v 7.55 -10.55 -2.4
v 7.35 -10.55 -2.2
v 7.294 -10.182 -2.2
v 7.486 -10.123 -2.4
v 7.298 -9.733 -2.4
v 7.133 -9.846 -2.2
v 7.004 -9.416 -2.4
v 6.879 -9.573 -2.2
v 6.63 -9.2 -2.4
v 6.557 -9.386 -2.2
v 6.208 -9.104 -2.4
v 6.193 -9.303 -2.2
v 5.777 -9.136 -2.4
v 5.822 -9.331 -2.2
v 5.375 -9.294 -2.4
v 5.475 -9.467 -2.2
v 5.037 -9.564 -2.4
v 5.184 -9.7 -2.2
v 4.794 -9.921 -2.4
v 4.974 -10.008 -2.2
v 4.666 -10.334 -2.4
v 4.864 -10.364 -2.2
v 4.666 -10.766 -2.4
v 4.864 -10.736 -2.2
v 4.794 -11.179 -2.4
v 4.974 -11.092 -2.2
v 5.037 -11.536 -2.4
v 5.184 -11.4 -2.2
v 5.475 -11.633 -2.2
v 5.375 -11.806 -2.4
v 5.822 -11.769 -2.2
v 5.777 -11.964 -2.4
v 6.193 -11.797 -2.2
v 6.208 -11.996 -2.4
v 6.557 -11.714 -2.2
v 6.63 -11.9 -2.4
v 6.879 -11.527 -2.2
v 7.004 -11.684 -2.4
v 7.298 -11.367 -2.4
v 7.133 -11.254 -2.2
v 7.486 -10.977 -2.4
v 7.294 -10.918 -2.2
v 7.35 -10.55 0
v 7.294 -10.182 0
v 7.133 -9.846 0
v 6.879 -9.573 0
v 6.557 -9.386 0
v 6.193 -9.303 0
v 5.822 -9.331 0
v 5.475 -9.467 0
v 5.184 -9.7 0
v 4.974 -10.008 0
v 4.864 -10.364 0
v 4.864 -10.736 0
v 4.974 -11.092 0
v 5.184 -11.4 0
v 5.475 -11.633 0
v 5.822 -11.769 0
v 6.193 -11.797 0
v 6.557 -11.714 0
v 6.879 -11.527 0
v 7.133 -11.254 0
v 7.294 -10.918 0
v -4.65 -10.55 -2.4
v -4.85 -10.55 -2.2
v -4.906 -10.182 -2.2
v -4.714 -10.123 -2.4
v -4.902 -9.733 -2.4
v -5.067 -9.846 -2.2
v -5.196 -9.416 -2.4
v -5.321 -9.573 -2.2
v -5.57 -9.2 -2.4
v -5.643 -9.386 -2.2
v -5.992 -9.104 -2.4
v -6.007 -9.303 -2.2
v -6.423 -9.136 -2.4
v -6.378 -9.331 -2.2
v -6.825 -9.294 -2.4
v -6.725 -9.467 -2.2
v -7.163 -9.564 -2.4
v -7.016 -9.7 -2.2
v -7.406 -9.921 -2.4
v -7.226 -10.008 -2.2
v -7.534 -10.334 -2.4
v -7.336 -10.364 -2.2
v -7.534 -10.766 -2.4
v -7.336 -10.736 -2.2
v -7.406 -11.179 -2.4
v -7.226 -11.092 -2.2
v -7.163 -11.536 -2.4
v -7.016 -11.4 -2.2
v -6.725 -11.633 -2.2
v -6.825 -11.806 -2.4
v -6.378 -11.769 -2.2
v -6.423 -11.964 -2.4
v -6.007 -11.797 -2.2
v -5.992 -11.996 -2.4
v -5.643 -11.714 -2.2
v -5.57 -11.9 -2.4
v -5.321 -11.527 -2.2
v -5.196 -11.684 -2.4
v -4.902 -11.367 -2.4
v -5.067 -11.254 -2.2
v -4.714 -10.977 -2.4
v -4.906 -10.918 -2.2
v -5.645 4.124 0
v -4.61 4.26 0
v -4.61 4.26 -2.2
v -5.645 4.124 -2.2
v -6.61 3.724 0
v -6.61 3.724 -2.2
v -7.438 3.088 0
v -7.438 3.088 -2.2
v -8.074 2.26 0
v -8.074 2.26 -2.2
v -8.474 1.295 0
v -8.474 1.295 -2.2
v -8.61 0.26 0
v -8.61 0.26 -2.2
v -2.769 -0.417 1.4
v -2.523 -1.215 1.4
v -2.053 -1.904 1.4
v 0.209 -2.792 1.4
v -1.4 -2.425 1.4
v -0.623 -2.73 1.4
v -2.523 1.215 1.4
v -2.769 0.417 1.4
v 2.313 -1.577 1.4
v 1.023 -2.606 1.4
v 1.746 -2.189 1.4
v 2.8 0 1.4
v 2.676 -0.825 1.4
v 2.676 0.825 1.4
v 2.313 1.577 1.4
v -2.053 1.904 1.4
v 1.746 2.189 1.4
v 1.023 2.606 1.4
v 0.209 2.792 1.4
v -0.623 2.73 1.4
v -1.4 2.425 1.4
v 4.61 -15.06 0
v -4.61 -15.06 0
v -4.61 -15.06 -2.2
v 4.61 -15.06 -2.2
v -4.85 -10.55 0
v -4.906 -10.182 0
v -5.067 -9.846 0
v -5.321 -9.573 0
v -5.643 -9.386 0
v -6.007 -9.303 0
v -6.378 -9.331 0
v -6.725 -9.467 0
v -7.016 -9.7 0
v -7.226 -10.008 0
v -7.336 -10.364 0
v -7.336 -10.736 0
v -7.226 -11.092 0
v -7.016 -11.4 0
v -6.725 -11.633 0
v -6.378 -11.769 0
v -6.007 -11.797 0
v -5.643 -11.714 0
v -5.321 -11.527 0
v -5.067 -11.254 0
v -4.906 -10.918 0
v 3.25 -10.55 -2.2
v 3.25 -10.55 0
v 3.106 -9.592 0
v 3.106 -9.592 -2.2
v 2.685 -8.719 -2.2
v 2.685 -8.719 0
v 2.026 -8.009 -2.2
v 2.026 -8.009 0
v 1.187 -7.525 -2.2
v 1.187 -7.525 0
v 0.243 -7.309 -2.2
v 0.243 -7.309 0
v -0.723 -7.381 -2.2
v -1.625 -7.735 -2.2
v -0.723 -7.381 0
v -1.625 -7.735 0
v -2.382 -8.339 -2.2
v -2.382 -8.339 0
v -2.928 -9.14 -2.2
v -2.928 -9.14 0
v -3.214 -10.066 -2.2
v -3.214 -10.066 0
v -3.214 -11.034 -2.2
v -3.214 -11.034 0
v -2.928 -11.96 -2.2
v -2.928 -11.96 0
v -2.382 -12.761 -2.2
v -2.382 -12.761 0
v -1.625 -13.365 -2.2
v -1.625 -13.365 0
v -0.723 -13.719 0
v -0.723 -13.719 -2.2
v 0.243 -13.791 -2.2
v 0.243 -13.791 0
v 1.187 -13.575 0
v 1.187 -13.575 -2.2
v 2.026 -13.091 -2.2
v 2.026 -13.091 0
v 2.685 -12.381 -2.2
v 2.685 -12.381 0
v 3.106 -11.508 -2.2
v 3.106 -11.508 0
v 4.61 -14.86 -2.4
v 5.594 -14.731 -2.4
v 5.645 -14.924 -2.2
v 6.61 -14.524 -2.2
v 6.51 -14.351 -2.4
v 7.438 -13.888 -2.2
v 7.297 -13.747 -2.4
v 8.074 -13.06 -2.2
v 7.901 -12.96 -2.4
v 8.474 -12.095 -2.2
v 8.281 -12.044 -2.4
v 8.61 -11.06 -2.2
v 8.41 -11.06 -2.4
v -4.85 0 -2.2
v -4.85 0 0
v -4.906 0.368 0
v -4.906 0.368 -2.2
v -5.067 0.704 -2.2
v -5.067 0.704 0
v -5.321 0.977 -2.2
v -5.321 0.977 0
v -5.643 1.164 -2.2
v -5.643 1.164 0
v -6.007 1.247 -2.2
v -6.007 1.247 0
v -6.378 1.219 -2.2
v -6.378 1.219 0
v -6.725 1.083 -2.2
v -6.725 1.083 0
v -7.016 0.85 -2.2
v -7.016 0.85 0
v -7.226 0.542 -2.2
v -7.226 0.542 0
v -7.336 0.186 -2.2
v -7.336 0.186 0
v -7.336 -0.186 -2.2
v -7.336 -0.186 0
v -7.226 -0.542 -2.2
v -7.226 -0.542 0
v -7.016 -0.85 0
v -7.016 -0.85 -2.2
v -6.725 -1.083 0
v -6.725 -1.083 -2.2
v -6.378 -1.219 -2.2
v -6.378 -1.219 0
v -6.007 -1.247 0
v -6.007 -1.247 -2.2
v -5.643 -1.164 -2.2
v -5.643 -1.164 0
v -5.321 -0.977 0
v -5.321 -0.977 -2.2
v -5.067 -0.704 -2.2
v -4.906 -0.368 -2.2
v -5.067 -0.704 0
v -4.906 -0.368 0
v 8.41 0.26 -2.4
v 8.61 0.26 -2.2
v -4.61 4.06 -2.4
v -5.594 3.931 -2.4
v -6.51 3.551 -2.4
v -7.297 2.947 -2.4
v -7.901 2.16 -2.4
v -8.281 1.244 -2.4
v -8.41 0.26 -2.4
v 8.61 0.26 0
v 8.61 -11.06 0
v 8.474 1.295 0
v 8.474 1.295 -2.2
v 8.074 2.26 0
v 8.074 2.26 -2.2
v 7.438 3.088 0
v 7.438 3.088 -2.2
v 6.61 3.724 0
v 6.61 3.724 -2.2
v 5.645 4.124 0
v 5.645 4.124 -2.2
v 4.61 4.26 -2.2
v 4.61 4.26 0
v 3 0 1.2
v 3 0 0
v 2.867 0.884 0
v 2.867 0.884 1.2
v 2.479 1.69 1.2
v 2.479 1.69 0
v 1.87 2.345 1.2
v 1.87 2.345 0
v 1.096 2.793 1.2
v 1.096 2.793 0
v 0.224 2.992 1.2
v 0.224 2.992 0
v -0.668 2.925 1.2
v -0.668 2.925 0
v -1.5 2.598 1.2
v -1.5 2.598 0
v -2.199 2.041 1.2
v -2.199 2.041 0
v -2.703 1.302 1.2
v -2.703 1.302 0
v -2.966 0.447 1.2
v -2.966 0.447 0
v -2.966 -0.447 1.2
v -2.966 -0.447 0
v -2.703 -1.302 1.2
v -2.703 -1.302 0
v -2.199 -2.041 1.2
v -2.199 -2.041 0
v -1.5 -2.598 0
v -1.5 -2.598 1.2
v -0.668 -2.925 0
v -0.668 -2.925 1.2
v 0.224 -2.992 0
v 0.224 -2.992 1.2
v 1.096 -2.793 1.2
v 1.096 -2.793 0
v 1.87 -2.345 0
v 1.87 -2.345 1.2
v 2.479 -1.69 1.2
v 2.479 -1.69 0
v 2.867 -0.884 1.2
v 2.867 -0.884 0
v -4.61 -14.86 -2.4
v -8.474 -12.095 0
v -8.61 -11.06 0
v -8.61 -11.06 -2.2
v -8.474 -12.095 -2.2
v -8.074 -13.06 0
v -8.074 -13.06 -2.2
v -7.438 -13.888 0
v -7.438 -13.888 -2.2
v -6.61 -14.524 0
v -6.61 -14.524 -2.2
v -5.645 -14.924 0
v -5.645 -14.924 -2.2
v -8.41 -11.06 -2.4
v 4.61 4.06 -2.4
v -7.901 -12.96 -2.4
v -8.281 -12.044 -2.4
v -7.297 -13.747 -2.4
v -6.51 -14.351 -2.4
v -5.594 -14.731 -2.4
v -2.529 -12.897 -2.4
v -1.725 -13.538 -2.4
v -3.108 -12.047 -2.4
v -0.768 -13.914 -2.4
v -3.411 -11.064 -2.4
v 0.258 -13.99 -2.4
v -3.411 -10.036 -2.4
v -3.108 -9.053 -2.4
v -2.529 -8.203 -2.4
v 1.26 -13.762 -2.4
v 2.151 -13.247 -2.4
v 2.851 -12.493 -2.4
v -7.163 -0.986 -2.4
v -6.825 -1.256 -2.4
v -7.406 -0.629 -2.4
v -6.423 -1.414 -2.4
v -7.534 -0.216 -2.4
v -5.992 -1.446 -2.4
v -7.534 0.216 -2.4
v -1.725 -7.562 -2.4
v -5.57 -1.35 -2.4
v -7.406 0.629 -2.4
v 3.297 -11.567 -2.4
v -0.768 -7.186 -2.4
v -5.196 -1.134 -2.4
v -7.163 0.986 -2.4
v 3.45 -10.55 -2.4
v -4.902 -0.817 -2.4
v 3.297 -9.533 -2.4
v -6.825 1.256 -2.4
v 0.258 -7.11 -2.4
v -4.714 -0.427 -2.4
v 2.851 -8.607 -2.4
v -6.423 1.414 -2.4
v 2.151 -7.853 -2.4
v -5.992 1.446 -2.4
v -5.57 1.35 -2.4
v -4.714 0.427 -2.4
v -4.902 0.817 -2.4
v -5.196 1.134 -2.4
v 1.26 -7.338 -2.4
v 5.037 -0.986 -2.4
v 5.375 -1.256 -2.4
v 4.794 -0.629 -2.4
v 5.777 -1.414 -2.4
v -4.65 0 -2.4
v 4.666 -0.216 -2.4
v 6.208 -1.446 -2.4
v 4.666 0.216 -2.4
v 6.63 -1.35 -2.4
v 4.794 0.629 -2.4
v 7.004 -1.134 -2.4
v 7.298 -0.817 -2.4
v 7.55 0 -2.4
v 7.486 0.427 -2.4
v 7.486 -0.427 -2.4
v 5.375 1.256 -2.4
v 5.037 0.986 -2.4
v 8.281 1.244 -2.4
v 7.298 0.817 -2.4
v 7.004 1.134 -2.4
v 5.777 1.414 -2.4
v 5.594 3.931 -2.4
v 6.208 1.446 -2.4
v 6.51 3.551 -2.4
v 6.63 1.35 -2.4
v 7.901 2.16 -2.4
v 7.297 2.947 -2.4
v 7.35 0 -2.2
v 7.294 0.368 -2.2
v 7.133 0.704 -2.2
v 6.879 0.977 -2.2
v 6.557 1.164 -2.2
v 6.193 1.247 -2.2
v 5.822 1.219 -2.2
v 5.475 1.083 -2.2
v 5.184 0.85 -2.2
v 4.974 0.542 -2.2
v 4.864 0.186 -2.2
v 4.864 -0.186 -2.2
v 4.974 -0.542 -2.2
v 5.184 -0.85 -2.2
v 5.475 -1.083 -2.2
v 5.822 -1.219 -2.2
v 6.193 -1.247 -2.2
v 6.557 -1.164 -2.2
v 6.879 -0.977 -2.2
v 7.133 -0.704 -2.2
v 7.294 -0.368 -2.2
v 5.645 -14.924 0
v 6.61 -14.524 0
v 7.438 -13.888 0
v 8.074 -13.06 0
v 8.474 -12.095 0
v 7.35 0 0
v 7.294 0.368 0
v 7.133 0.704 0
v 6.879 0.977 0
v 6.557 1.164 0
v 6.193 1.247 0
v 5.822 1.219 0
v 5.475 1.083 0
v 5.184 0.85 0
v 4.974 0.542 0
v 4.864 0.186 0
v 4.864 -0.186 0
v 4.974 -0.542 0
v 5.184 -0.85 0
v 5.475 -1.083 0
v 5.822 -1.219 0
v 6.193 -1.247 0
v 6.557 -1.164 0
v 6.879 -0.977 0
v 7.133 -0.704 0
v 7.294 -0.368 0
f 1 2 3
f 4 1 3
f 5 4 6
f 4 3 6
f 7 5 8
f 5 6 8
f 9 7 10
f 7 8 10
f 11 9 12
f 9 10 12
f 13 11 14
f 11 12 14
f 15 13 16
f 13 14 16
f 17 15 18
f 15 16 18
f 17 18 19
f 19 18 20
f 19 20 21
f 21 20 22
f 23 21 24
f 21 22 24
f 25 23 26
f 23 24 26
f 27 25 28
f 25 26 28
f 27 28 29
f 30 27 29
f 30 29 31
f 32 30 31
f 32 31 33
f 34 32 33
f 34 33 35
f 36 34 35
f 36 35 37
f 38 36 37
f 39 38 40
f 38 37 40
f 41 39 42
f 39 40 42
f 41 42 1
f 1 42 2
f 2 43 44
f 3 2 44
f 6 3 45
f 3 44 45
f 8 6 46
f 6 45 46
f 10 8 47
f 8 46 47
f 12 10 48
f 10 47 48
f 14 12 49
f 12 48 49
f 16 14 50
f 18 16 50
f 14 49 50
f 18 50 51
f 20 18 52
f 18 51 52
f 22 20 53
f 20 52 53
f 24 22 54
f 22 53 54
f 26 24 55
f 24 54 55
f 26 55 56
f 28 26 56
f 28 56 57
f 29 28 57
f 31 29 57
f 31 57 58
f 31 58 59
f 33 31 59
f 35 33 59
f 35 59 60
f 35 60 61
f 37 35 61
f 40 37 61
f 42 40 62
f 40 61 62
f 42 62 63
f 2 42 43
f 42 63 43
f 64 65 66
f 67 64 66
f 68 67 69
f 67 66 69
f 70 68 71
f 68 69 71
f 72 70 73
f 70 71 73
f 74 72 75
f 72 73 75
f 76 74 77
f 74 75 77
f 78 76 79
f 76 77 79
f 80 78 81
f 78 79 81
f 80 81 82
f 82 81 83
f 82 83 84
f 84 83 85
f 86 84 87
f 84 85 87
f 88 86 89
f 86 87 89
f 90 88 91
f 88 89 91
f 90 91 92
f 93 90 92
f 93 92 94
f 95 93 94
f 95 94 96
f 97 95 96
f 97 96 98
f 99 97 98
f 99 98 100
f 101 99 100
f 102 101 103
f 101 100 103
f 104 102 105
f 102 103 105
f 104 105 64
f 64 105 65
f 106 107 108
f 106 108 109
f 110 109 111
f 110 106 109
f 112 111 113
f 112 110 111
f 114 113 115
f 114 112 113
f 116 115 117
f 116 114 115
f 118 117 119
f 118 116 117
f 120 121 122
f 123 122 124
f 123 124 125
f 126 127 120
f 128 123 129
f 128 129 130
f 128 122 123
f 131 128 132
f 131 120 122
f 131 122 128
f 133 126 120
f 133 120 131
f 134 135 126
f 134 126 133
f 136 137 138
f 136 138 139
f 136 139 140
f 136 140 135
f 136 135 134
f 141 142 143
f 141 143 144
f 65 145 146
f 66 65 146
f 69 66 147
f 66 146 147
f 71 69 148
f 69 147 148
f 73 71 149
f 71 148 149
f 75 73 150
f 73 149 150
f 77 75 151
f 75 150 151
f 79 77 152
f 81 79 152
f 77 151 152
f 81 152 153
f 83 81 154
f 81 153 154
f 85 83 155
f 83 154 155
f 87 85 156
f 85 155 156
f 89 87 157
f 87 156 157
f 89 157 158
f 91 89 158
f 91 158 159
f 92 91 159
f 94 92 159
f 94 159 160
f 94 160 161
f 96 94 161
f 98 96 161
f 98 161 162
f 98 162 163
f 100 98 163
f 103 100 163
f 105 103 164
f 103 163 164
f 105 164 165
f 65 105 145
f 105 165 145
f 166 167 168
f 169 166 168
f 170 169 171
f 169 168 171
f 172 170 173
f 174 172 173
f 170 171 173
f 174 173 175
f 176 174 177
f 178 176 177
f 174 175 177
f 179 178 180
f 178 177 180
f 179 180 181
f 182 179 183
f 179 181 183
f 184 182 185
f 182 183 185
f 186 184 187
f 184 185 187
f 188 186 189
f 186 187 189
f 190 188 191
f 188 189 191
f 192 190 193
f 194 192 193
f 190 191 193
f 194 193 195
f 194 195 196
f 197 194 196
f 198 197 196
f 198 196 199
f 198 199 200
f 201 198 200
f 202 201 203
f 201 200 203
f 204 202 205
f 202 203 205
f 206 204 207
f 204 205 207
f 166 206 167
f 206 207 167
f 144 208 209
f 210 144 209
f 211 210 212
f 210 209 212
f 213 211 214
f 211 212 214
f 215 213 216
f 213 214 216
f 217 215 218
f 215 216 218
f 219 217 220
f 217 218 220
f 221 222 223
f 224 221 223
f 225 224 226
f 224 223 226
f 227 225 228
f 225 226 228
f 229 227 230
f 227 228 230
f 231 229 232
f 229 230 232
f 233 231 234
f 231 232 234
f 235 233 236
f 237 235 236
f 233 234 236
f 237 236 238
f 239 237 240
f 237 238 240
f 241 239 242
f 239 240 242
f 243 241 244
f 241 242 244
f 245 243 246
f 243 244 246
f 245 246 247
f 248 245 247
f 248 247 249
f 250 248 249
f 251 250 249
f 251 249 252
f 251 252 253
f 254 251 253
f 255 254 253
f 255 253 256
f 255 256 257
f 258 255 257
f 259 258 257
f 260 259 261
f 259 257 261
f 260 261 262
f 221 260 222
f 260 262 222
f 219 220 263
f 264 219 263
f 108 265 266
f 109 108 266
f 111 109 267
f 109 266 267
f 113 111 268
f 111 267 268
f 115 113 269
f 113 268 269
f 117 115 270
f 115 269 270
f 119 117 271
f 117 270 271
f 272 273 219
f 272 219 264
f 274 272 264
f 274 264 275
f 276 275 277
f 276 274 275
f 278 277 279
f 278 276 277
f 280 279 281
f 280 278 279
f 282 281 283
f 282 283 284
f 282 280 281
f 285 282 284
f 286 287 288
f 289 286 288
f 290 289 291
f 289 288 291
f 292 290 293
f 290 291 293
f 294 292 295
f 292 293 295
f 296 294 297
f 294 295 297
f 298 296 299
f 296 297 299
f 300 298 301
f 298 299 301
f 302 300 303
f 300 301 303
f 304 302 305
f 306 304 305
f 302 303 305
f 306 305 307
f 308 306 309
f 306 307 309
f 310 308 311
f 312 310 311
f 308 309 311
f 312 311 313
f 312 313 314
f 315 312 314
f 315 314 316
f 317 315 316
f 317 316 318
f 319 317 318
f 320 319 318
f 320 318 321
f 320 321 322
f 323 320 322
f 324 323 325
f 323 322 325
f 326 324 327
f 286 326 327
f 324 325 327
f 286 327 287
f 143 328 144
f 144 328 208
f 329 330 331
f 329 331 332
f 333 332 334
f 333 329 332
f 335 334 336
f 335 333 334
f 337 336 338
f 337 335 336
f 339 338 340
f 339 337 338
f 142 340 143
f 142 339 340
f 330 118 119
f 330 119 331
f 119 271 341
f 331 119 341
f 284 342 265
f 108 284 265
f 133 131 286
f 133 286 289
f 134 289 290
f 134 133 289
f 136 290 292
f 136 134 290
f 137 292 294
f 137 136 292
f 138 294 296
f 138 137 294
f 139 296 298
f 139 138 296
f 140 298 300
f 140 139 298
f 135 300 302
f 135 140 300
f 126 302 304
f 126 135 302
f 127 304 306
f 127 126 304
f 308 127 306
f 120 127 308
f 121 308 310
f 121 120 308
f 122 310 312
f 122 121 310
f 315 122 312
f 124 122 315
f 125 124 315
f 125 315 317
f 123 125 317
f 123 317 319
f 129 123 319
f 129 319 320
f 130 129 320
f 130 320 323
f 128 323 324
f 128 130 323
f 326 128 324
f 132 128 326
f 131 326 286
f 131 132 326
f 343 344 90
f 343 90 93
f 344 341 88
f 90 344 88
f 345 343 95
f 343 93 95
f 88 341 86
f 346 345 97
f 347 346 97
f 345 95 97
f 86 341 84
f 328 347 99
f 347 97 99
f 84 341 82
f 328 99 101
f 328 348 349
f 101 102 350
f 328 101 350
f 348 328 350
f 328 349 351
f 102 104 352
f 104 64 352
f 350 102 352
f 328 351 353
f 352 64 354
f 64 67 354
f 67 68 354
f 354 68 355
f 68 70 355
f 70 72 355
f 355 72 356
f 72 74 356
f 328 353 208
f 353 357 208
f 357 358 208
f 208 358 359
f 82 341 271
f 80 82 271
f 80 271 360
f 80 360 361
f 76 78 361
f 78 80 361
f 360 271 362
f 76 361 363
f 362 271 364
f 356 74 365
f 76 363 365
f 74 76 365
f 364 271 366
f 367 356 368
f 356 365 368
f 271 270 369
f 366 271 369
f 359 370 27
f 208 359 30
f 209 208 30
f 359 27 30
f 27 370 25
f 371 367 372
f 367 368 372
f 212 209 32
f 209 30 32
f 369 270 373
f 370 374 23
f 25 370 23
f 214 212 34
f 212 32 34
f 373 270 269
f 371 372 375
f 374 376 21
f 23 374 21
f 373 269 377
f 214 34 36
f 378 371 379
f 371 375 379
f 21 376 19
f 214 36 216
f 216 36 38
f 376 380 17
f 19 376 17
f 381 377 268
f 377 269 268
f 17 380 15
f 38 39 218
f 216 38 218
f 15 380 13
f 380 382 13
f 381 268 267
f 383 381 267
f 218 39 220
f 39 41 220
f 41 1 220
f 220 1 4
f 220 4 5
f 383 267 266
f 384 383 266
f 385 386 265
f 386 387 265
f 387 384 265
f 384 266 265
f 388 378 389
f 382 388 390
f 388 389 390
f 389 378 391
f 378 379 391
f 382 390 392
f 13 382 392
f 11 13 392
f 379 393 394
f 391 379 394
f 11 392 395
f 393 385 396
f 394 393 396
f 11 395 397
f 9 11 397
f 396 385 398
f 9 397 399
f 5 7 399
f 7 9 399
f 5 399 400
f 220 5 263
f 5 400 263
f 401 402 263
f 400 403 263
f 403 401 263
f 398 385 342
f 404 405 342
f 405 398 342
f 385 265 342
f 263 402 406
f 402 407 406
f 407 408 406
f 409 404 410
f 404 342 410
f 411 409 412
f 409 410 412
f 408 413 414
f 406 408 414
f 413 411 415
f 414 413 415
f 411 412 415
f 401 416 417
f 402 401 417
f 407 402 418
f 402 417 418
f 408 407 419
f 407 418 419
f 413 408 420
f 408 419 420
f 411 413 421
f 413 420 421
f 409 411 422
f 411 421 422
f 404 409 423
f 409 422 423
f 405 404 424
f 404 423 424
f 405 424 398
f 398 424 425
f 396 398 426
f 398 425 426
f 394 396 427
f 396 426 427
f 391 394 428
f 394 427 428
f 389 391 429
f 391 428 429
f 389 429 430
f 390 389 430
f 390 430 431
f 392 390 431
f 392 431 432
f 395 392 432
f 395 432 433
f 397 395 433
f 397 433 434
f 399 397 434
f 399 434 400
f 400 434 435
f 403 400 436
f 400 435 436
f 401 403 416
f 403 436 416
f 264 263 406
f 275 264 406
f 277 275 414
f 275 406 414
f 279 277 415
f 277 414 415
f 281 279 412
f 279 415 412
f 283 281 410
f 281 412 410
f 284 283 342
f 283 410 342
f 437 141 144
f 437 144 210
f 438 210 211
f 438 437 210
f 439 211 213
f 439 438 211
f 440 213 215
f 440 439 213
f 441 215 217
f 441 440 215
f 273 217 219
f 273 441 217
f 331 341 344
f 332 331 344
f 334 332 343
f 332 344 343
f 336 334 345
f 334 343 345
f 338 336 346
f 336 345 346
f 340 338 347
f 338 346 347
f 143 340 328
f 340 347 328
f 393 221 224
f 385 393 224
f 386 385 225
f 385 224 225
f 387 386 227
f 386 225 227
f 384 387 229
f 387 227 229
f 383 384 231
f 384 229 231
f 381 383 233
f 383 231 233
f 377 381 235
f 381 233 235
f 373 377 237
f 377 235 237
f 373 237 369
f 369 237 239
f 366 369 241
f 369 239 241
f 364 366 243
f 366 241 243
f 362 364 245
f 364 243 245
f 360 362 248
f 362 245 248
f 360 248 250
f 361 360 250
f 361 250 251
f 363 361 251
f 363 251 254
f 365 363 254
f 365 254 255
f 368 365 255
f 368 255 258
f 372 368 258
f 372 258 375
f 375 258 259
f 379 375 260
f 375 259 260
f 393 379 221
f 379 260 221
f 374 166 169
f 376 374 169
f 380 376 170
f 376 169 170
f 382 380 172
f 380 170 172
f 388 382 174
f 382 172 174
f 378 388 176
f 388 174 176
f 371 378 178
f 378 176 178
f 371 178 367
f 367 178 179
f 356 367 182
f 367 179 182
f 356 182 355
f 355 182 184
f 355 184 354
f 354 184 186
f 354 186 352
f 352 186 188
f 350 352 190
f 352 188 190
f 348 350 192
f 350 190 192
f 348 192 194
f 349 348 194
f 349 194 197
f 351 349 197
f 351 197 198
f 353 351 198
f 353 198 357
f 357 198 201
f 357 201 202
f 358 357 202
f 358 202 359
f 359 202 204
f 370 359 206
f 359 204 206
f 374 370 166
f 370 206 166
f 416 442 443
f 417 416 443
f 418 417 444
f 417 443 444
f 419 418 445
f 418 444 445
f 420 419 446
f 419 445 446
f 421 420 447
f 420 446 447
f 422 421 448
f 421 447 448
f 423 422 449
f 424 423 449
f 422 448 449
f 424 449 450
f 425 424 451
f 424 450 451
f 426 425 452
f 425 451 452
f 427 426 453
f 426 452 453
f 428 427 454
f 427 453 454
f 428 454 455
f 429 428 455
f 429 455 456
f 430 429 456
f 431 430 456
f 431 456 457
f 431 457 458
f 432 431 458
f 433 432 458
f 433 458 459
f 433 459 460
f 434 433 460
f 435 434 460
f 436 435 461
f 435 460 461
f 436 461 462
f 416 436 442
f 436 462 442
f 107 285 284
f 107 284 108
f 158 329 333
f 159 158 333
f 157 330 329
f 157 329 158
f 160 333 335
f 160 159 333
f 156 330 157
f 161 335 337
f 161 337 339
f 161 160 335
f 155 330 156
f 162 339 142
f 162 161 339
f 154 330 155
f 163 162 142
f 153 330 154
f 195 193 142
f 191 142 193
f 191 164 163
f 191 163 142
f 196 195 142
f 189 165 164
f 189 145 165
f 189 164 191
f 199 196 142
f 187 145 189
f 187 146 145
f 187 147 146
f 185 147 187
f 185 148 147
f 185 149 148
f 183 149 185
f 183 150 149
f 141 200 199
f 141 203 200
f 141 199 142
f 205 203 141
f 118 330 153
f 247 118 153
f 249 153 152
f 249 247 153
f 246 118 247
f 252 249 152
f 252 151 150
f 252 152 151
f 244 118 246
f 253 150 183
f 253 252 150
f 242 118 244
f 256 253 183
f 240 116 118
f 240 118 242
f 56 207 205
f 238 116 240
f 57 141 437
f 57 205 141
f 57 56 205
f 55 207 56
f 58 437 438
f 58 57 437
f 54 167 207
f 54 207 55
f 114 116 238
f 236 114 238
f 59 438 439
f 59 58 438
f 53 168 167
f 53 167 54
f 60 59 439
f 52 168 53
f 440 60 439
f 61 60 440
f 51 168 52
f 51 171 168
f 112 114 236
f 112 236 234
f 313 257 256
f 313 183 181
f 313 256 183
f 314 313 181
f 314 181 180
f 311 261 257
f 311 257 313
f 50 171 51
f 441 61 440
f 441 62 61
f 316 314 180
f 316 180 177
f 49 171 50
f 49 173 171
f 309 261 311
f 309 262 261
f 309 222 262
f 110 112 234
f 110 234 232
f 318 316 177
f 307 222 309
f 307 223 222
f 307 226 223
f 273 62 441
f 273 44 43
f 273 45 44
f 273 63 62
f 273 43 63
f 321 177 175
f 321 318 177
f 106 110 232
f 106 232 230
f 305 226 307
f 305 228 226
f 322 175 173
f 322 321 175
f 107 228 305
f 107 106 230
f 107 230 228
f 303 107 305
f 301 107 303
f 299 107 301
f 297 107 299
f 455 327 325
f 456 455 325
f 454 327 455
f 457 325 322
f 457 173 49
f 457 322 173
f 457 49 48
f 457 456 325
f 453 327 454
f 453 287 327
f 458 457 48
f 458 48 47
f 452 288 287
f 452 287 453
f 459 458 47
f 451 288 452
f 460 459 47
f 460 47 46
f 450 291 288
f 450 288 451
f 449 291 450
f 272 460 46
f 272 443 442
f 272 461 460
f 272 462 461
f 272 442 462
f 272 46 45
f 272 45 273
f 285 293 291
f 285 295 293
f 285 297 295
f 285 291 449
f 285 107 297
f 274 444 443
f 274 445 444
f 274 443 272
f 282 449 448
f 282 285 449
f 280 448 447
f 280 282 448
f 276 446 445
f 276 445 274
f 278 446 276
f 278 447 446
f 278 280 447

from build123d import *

# Parameters (mm, degrees)
F0_R     = 1.25
F0_R_2   = 3
F0_R_3   = 3.25
F1_DEPTH = 2.4
F2_DEPTH = 1.4
F3_SIZE  = 0.2
F4_SIZE  = 0.2


with BuildPart() as f1:
    # F0 (on Top) → F1 (new body)
    with BuildSketch(Plane.XY):
        with BuildLine():
            ThreePointArc((8.61, 0.26), (7.4384271247, 3.0884271247), (4.61, 4.26))
            Line((4.61, 4.26), (-4.61, 4.26))
            ThreePointArc((-4.61, 4.26), (-7.4384271247, 3.0884271247), (-8.61, 0.26))
            Line((-8.61, 0.26), (-8.61, -4.26))
            Line((-8.61, -4.26), (8.61, -4.26))
            Line((8.61, -4.26), (8.61, 0.26))
        make_face()
        with Locations((-6.1, 0)):
            Circle(F0_R, mode=Mode.SUBTRACT)
        Circle(F0_R_2, mode=Mode.SUBTRACT)
        with Locations((6.1, 0)):
            Circle(F0_R, mode=Mode.SUBTRACT)
        with BuildLine():
            Line((8.61, -11.06), (8.61, -4.26))
            Line((8.61, -4.26), (-8.61, -4.26))
            Line((-8.61, -4.26), (-8.61, -11.06))
            ThreePointArc((-8.61, -11.06), (-7.4384271247, -13.8884271247), (-4.61, -15.06))
            Line((-4.61, -15.06), (4.61, -15.06))
            ThreePointArc((4.61, -15.06), (7.4384271247, -13.8884271247), (8.61, -11.06))
        make_face()
        with Locations((-6.1, -10.55)):
            Circle(F0_R, mode=Mode.SUBTRACT)
        with Locations((0, -10.55)):
            Circle(F0_R_3, mode=Mode.SUBTRACT)
        with Locations((6.1, -10.55)):
            Circle(F0_R, mode=Mode.SUBTRACT)
        Circle(F0_R_2)
    extrude(amount=-F1_DEPTH)

    # F0 (on Top) → F2 (join)
    with BuildSketch(Plane.XY):
        Circle(F0_R_2)
    extrude(amount=F2_DEPTH)

    # F3
    f3_edges = [f1.edges().sort_by_distance(p)[0] for p in [
        (7.438427, 3.088427, -2.4),
        (0, 4.26, -2.4),
        (-7.438427, 3.088427, -2.4),
        (-8.61, -5.4, -2.4),
        (-7.438427, -13.888427, -2.4),
        (0, -15.06, -2.4),
        (7.438427, -13.888427, -2.4),
        (8.61, -5.4, -2.4),
        (-7.35, 0, -2.4),
        (4.85, 0, -2.4),
        (4.85, -10.55, -2.4),
        (-7.35, -10.55, -2.4),
        (-3.25, -10.55, -2.4),
    ]]
    chamfer(f3_edges, length=F3_SIZE)

    # F4
    f4_edges = [f1.edges().sort_by_distance(p)[0] for p in [
        (-3, 0, 1.4),
    ]]
    chamfer(f4_edges, length=F4_SIZE)


solid = f1.part
